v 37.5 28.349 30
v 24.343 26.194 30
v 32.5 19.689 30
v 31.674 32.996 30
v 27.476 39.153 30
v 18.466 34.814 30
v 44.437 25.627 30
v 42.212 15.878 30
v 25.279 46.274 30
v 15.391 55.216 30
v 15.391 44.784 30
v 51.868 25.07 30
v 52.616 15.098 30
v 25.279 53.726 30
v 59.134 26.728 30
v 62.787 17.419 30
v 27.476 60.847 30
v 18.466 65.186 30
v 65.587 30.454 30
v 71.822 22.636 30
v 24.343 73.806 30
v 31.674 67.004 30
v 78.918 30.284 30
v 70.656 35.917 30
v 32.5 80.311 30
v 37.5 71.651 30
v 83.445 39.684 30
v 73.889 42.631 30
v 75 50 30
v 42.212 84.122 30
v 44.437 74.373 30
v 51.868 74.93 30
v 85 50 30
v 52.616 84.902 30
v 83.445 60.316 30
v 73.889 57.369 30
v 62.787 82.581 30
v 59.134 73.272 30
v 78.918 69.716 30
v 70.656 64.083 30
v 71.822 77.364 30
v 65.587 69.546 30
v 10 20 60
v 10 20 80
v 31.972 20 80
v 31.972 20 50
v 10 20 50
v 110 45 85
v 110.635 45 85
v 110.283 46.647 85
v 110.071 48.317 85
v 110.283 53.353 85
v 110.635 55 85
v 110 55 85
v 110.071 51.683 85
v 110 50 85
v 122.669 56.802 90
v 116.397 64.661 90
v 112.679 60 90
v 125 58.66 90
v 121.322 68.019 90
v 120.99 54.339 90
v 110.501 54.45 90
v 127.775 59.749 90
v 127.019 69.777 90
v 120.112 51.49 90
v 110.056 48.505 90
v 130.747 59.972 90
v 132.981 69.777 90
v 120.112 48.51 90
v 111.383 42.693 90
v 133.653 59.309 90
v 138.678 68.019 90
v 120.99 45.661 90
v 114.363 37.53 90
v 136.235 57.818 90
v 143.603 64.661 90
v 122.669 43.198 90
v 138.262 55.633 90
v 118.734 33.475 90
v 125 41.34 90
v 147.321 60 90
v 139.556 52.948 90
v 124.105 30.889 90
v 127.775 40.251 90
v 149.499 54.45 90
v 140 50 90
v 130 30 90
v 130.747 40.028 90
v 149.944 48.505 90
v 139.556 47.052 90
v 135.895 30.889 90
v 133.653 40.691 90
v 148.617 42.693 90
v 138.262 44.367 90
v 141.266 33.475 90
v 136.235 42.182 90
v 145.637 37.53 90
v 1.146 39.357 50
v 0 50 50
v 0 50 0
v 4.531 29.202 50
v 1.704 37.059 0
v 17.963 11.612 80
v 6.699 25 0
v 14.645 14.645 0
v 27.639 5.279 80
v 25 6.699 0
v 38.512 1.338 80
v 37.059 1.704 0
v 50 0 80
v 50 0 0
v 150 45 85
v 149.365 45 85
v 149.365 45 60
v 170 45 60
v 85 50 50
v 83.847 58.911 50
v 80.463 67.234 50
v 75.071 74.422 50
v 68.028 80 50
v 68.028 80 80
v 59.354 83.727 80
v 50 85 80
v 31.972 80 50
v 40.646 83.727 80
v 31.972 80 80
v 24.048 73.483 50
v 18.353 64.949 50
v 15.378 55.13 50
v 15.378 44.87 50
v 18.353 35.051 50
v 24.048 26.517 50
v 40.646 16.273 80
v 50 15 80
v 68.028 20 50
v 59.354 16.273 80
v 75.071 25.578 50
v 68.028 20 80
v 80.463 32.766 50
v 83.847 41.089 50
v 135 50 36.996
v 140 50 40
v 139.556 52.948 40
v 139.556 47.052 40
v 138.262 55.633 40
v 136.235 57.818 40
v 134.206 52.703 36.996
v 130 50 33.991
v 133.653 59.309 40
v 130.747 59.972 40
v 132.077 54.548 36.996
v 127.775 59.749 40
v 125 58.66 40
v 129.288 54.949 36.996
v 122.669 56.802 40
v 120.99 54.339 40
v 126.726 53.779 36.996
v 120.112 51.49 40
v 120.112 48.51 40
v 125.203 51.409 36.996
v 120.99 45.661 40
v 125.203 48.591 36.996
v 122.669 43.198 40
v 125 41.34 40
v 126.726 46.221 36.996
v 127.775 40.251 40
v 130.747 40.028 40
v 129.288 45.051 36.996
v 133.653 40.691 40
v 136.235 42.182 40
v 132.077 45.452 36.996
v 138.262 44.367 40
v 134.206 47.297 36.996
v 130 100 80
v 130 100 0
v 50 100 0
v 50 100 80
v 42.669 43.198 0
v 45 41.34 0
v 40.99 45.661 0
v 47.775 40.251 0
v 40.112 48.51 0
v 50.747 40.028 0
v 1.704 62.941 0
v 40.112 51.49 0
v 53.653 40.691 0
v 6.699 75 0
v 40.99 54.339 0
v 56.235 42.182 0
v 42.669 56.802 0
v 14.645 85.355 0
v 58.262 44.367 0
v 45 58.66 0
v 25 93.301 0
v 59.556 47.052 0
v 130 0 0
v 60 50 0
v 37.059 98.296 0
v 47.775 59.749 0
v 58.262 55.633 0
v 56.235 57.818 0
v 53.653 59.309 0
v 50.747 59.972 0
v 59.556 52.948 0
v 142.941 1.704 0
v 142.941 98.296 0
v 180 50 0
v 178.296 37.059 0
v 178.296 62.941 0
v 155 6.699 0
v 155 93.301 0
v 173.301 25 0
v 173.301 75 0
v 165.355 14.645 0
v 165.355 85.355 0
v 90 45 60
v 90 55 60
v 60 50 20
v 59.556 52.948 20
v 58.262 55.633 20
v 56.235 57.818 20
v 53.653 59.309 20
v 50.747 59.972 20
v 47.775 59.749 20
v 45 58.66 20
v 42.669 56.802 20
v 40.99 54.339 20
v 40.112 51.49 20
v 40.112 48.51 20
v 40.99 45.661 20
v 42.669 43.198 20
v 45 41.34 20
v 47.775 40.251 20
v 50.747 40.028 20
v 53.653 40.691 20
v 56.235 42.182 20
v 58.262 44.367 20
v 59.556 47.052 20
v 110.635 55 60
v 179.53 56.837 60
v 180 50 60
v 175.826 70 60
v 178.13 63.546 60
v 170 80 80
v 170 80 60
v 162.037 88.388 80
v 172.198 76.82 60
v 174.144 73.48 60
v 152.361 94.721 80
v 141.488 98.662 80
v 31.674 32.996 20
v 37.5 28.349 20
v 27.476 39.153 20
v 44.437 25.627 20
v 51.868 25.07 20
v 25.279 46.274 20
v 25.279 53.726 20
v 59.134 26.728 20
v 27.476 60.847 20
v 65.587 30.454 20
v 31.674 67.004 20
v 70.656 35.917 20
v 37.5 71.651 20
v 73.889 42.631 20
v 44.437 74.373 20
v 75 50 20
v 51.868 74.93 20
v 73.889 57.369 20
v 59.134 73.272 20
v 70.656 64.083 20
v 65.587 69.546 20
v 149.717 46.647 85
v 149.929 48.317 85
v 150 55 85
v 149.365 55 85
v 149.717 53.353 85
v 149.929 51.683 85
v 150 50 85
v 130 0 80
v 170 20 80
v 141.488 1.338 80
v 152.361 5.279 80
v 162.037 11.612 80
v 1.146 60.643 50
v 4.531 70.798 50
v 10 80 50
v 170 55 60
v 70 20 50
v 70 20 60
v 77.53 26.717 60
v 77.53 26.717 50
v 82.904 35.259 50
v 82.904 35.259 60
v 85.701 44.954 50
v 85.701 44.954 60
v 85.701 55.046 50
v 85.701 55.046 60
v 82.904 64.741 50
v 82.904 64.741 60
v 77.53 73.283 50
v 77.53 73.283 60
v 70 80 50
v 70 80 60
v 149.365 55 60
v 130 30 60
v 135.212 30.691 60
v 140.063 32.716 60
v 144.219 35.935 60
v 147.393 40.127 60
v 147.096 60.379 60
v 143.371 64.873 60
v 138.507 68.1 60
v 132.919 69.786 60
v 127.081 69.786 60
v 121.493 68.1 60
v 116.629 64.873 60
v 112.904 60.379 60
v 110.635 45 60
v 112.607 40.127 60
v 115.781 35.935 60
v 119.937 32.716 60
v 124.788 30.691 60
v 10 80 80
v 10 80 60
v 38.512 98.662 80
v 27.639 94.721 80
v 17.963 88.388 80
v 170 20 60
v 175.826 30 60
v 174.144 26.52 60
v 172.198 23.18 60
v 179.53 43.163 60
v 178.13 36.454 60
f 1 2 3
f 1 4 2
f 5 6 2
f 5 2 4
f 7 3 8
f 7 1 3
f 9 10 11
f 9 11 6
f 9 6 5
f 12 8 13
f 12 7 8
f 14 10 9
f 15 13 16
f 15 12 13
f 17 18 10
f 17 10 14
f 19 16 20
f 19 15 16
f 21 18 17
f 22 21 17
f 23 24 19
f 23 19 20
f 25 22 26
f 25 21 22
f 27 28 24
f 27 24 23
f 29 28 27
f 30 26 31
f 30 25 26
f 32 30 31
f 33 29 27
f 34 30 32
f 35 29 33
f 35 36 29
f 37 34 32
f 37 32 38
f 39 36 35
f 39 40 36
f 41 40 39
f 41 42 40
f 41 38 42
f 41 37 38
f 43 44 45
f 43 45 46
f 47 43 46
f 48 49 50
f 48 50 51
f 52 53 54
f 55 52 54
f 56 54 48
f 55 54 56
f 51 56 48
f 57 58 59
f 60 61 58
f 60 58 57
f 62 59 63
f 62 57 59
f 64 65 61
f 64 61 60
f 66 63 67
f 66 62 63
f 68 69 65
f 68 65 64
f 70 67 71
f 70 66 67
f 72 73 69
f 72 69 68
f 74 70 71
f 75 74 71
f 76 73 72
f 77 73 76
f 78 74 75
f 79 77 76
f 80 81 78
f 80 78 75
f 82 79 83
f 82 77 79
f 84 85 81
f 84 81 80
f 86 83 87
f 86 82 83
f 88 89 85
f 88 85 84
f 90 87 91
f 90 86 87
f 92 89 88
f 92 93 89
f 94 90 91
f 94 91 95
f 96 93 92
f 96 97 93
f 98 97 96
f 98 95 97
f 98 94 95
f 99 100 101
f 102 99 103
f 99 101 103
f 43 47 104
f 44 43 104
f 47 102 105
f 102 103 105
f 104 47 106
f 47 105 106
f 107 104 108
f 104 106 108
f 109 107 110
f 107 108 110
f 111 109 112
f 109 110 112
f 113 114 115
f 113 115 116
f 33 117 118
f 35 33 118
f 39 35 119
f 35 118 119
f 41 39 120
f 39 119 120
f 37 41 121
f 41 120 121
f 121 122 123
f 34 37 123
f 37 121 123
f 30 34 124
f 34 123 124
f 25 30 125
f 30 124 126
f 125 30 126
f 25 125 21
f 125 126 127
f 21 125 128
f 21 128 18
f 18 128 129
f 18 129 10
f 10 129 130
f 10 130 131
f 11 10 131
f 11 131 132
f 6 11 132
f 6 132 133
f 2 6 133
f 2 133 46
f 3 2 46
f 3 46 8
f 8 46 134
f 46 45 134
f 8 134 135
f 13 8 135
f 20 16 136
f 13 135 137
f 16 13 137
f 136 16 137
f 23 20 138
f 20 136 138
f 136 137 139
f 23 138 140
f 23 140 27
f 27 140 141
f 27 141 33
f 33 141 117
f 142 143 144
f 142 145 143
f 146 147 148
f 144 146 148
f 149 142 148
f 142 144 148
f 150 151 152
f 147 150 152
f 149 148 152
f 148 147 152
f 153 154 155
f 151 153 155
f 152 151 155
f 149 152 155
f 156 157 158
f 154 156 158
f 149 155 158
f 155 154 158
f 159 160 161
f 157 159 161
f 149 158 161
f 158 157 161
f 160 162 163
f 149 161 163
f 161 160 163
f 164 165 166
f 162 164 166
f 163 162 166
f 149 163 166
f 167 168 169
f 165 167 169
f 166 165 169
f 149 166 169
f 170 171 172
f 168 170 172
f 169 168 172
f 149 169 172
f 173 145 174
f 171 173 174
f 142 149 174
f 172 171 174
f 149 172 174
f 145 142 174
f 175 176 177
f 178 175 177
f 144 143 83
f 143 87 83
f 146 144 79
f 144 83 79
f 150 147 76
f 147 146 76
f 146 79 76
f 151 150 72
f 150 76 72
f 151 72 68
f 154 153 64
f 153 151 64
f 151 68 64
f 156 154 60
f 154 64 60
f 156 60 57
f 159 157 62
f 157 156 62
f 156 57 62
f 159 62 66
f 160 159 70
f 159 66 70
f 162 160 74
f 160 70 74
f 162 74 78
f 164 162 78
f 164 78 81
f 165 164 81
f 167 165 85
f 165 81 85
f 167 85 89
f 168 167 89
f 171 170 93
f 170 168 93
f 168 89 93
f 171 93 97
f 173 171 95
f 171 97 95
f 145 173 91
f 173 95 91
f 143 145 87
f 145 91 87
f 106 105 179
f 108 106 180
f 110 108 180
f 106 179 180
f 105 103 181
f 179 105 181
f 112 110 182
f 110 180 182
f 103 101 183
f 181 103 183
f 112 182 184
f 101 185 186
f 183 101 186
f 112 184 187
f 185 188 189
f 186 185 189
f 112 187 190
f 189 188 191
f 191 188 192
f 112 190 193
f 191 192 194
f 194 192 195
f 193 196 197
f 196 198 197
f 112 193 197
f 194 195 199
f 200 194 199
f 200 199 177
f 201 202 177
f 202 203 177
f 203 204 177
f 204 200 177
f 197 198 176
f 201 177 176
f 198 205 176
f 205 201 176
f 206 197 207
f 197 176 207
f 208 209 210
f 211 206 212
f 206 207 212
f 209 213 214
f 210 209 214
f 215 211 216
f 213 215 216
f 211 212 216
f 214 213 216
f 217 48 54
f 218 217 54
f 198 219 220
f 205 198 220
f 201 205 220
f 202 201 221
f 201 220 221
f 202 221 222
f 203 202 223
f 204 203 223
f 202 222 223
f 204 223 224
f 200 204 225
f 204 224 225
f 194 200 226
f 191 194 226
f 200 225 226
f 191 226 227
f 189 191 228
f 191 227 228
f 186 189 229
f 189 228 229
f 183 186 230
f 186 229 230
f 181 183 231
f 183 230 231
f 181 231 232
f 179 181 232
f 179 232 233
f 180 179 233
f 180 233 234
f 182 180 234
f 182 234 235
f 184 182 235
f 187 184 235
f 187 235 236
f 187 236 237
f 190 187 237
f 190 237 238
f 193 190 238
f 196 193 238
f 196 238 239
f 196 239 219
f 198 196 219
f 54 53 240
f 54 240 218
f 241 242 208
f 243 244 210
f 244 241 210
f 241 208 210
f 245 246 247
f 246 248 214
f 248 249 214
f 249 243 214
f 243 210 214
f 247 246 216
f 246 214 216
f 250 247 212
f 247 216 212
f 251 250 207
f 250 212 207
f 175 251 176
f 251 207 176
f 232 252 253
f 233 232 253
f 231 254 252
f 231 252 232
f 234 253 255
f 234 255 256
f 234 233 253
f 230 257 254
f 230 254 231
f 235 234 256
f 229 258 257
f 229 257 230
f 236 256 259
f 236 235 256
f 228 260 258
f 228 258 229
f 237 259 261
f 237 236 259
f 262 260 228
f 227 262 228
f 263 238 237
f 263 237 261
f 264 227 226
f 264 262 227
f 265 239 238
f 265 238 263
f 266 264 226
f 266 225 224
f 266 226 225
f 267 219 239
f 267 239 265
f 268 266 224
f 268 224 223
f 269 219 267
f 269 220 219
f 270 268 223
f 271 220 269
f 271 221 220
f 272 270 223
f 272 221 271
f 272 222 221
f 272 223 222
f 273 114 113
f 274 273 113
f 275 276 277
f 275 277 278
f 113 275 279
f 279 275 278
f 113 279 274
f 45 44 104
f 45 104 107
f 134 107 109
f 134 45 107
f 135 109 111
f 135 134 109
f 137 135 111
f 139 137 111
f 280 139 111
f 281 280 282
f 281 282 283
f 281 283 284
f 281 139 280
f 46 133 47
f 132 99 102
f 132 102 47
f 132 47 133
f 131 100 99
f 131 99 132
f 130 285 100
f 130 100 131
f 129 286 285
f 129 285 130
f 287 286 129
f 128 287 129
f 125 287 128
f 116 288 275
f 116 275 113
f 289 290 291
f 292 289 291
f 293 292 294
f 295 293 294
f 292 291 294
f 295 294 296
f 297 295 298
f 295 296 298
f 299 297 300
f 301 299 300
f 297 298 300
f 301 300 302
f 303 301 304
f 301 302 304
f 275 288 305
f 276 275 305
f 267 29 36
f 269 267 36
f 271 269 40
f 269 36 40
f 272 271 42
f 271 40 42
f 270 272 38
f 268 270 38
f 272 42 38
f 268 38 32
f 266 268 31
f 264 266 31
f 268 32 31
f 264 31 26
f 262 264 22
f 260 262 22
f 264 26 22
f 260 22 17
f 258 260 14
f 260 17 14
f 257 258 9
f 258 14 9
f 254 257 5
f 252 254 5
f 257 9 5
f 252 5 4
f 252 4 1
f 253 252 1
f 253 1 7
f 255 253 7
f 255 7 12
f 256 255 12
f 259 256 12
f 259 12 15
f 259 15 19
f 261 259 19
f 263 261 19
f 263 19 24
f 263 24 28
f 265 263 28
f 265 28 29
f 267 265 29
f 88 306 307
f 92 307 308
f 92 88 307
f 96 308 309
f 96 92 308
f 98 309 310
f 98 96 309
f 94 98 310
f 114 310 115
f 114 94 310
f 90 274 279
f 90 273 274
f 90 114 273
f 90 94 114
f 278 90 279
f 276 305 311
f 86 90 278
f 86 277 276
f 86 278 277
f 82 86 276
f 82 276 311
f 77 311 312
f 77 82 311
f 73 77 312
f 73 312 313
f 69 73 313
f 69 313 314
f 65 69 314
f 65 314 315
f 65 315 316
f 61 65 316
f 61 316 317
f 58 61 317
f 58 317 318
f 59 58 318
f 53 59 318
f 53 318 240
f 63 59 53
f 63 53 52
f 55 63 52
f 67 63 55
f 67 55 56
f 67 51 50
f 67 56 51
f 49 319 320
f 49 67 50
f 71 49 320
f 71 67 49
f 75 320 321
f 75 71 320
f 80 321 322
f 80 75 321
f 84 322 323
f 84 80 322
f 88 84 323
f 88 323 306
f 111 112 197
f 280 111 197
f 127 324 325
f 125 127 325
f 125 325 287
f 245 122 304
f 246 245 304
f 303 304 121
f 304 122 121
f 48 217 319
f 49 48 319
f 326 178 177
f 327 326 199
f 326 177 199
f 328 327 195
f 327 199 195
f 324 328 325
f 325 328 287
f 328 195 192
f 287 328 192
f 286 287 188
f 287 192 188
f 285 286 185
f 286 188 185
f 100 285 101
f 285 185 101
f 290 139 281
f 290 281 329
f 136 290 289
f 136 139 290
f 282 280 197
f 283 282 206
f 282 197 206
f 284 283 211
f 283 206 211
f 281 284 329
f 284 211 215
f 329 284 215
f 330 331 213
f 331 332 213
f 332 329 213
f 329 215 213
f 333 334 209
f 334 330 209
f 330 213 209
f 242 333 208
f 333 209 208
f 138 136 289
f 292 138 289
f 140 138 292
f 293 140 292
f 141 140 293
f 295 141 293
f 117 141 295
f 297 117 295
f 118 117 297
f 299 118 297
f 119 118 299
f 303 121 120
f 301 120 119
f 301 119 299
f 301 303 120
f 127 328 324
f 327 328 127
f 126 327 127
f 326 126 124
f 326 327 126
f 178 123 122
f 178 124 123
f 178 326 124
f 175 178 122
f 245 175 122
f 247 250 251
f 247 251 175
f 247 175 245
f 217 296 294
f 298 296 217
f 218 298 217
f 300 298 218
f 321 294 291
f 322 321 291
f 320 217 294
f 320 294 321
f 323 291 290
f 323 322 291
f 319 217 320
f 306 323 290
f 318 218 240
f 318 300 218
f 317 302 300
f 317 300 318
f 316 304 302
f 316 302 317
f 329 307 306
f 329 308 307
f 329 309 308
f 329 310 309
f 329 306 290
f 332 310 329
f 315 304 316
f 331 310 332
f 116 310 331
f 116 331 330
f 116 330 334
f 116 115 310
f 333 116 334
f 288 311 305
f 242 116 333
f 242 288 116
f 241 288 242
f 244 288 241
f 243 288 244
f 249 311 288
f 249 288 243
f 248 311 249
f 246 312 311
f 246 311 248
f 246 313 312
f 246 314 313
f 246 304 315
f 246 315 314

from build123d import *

# Parameters (mm, degrees)
BOSS_EXTRUDE1_DEPTH        = 80
SKETCH2_W                  = 20
SKETCH2_H                  = 10
CUT_EXTRUDE1_DEPTH         = 209
SKETCH3_R                  = 10
CUT_EXTRUDE2_DEPTH         = 40
BOSS_EXTRUDE2_START        = 10
SKETCH4_R                  = 20
SKETCH4_R_2                = 10
BOSS_EXTRUDE2_DEPTH        = 10
F_20_0MM_DOWEL_HOLE1_D     = 20
F_20_0MM_DOWEL_HOLE1_DEPTH = 50
F_20_0MM_DOWEL_HOLE1_TIP   = 6.00860619
CUT_EXTRUDE3_DEPTH         = 20
SKETCH10_R                 = 10
CUT_EXTRUDE4_DEPTH         = 74
SKETCH11_R                 = 25
SKETCH11_R_2               = 10
CUT_EXTRUDE5_DEPTH         = 40
SKETCH12_R                 = 25
CUT_EXTRUDE6_DEPTH         = 10
SKETCH14_R                 = 35
SKETCH14_R_2               = 25
CUT_EXTRUDE7_DEPTH         = 30
SKETCH15_R                 = 35
CUT_EXTRUDE8_DEPTH         = 30
CUT_EXTRUDE9_DEPTH         = 20
BOSS_EXTRUDE3_START        = 25
SKETCH17_W                 = 20
SKETCH17_H                 = 5
BOSS_EXTRUDE3_DEPTH        = 25
SKETCH18_W                 = 20
SKETCH18_H                 = 5
BOSS_EXTRUDE4_DEPTH        = 25
SKETCH19_W                 = 20
SKETCH19_H                 = 5
BOSS_EXTRUDE5_DEPTH        = 25
CHAMFER1_SIZE2             = 20
CHAMFER1_SIZE              = 25
CHAMFER3_SIZE2             = 25
CHAMFER3_SIZE              = 20


with BuildPart() as part:
    # Sketch1 → Boss-Extrude1 (new body)
    with BuildSketch(Plane.XY):
        with BuildLine():
            ThreePointArc((0, 50), (14.644660941, 14.644660941), (50, 0))
            Line((50, 0), (130, 0))
            ThreePointArc((130, 0), (165.355339059, 14.644660941), (180, 50))
            ThreePointArc((180, 50), (165.355339059, 85.355339059), (130, 100))
            Line((130, 100), (50, 100))
            ThreePointArc((50, 100), (14.644660941, 85.355339059), (0, 50))
        make_face()
    extrude(amount=BOSS_EXTRUDE1_DEPTH)

    # Sketch2 → Cut-Extrude1 (cut)
    with BuildSketch(Plane(origin=(0, 0, 0), x_dir=(0, 0, -1), z_dir=(1, 0, 0))):
        with Locations((-70, 75)):
            Rectangle(SKETCH2_W, SKETCH2_H)
        with Locations((-70, 25)):
            Rectangle(SKETCH2_W, SKETCH2_H)
    extrude(amount=CUT_EXTRUDE1_DEPTH, mode=Mode.SUBTRACT)

    # Sketch3 → Cut-Extrude2 (cut)
    with BuildSketch(Plane.XY.offset(80)):
        with Locations((130, 50)):
            Circle(SKETCH3_R)
    extrude(amount=-CUT_EXTRUDE2_DEPTH, mode=Mode.SUBTRACT)

    # Sketch4 → Boss-Extrude2 (add)
    with BuildSketch(Plane.XY.offset(80).offset(BOSS_EXTRUDE2_START)):
        with Locations(Location((130, 50, 0), (0, 0, 270))):
            Circle(SKETCH4_R)
        with Locations((130, 50)):
            Circle(SKETCH4_R_2, mode=Mode.SUBTRACT)
    extrude(amount=-BOSS_EXTRUDE2_DEPTH)

    # Ø20.0mm Dowel Hole1
    with Locations(Plane(origin=(130, 50, 90), x_dir=(1, 0, 0), z_dir=(0, 0, 1))):
        with Locations((0, 0)):
            Hole(F_20_0MM_DOWEL_HOLE1_D / 2, depth=F_20_0MM_DOWEL_HOLE1_DEPTH)
            with Locations((0, 0, -(F_20_0MM_DOWEL_HOLE1_DEPTH + F_20_0MM_DOWEL_HOLE1_TIP / 2))):  # 118° drill point
                Cone(0, F_20_0MM_DOWEL_HOLE1_D / 2, F_20_0MM_DOWEL_HOLE1_TIP, mode=Mode.SUBTRACT)

    # Sketch9 → Cut-Extrude3 (cut)
    with BuildSketch(Plane.XY.offset(80)):
        with BuildLine():
            Line((130, 70), (4.17424305, 70))
            ThreePointArc((4.17424305, 70), (0, 50), (4.17424305, 30))
            Line((4.17424305, 30), (130, 30))
            ThreePointArc((130, 30), (110, 50), (130, 70))
        make_face()
    extrude(amount=-CUT_EXTRUDE3_DEPTH, mode=Mode.SUBTRACT)

    # Sketch10 → Cut-Extrude4 (cut)
    with BuildSketch(Plane.XY.offset(60)):
        with Locations((50, 50)):
            Circle(SKETCH10_R)
    extrude(amount=-CUT_EXTRUDE4_DEPTH, mode=Mode.SUBTRACT)

    # Sketch11 → Cut-Extrude5 (cut)
    with BuildSketch(Plane.XY.offset(60)):
        with Locations((50, 50)):
            Circle(SKETCH11_R)
        with Locations((50, 50)):
            Circle(SKETCH11_R_2, mode=Mode.SUBTRACT)
    extrude(amount=-CUT_EXTRUDE5_DEPTH, mode=Mode.SUBTRACT)

    # Sketch12 → Cut-Extrude6 (cut)
    with BuildSketch(Plane.XY.offset(60)):
        with BuildLine():
            Line((70, 80), (10, 80))
            ThreePointArc((10, 80), (0, 50), (10, 20))
            Line((10, 20), (70, 20))
            ThreePointArc((70, 20), (86.055512755, 50), (70, 80))
        make_face()
        with Locations((50, 50)):
            Circle(SKETCH12_R, mode=Mode.SUBTRACT)
    extrude(amount=-CUT_EXTRUDE6_DEPTH, mode=Mode.SUBTRACT)

    # Sketch14 → Cut-Extrude7 (cut)
    with BuildSketch(Plane.XY.offset(60)):
        with Locations((50, 50)):
            Circle(SKETCH14_R)
        with Locations((50, 50)):
            Circle(SKETCH14_R_2, mode=Mode.SUBTRACT)
    extrude(amount=-CUT_EXTRUDE7_DEPTH, mode=Mode.SUBTRACT)

    # Sketch15 → Cut-Extrude8 (cut)
    with BuildSketch(Plane.XY.offset(80)):
        with Locations((50, 50)):
            Circle(SKETCH15_R)
    extrude(amount=-CUT_EXTRUDE8_DEPTH, mode=Mode.SUBTRACT)

    # Sketch16 → Cut-Extrude9 (cut)
    with BuildSketch(Plane.XY.offset(80)):
        with BuildLine():
            Line((130, 70), (175.82575695, 70))
            ThreePointArc((175.82575695, 70), (180, 50), (175.82575695, 30))
            Line((175.82575695, 30), (130, 30))
            ThreePointArc((130, 30), (150, 50), (130, 70))
        make_face()
    extrude(amount=-CUT_EXTRUDE9_DEPTH, mode=Mode.SUBTRACT)

    # Sketch17 → Boss-Extrude3 (add)
    with BuildSketch(Plane.XY.offset(60).offset(BOSS_EXTRUDE3_START)):
        with BuildLine():
            Line((150, 45), (150, 50))
            ThreePointArc((150, 50), (149.840593925, 47.47991415), (149.364916731, 45))
            Line((149.364916731, 45), (150, 45))
        make_face()
        with Locations((160, 47.5)):
            Rectangle(SKETCH17_W, SKETCH17_H)
        with BuildLine():
            ThreePointArc((110.635083269, 45), (110.159406075, 47.47991415), (110, 50))
            Line((110, 50), (110, 45))
            Line((110, 45), (110.635083269, 45))
        make_face()
        with Locations((100, 47.5)):
            Rectangle(SKETCH17_W, SKETCH17_H)
    extrude(amount=-BOSS_EXTRUDE3_DEPTH)

    # Sketch18 → Boss-Extrude4 (add)
    with BuildSketch(Plane.XY.offset(85)):
        with BuildLine():
            ThreePointArc((110.635083269, 55), (110.159406075, 52.52008585), (110, 50))
            Line((110, 50), (110, 55))
            Line((110, 55), (110.635083269, 55))
        make_face()
        with Locations((100, 52.5)):
            Rectangle(SKETCH18_W, SKETCH18_H)
    extrude(amount=-BOSS_EXTRUDE4_DEPTH)

    # Sketch19 → Boss-Extrude5 (add)
    with BuildSketch(Plane.XY.offset(85)):
        with BuildLine():
            Line((150, 55), (149.364916731, 55))
            ThreePointArc((149.364916731, 55), (149.840593925, 52.52008585), (150, 50))
            Line((150, 50), (150, 55))
        make_face()
        with Locations((160, 52.5)):
            Rectangle(SKETCH19_W, SKETCH19_H)
    extrude(amount=-BOSS_EXTRUDE5_DEPTH)

    # Chamfer1
    chamfer1_edges = [part.edges().sort_by_distance(p)[0] for p in [
        (90, 52.5, 85),
    ]]
    chamfer1_side = [part.faces().sort_by_distance(p)[0] for p in [
        (90, 52.5, 84.6),
    ]]
    chamfer(chamfer1_edges, length=CHAMFER1_SIZE - 0.0001, length2=CHAMFER1_SIZE2 - 0.0001, reference=chamfer1_side[0])  # a hair under: the kernel refuses the full size

    # Chamfer3
    chamfer3_edges = [part.edges().sort_by_distance(p)[0] for p in [
        (170, 52.5, 85),
    ]]
    chamfer3_side = [part.faces().sort_by_distance(p)[0] for p in [
        (169.6, 52.5, 85),
    ]]
    chamfer(chamfer3_edges, length=CHAMFER3_SIZE - 0.0001, length2=CHAMFER3_SIZE2 - 0.0001, reference=chamfer3_side[0])  # a hair under: the kernel refuses the full size


solid = part.part
